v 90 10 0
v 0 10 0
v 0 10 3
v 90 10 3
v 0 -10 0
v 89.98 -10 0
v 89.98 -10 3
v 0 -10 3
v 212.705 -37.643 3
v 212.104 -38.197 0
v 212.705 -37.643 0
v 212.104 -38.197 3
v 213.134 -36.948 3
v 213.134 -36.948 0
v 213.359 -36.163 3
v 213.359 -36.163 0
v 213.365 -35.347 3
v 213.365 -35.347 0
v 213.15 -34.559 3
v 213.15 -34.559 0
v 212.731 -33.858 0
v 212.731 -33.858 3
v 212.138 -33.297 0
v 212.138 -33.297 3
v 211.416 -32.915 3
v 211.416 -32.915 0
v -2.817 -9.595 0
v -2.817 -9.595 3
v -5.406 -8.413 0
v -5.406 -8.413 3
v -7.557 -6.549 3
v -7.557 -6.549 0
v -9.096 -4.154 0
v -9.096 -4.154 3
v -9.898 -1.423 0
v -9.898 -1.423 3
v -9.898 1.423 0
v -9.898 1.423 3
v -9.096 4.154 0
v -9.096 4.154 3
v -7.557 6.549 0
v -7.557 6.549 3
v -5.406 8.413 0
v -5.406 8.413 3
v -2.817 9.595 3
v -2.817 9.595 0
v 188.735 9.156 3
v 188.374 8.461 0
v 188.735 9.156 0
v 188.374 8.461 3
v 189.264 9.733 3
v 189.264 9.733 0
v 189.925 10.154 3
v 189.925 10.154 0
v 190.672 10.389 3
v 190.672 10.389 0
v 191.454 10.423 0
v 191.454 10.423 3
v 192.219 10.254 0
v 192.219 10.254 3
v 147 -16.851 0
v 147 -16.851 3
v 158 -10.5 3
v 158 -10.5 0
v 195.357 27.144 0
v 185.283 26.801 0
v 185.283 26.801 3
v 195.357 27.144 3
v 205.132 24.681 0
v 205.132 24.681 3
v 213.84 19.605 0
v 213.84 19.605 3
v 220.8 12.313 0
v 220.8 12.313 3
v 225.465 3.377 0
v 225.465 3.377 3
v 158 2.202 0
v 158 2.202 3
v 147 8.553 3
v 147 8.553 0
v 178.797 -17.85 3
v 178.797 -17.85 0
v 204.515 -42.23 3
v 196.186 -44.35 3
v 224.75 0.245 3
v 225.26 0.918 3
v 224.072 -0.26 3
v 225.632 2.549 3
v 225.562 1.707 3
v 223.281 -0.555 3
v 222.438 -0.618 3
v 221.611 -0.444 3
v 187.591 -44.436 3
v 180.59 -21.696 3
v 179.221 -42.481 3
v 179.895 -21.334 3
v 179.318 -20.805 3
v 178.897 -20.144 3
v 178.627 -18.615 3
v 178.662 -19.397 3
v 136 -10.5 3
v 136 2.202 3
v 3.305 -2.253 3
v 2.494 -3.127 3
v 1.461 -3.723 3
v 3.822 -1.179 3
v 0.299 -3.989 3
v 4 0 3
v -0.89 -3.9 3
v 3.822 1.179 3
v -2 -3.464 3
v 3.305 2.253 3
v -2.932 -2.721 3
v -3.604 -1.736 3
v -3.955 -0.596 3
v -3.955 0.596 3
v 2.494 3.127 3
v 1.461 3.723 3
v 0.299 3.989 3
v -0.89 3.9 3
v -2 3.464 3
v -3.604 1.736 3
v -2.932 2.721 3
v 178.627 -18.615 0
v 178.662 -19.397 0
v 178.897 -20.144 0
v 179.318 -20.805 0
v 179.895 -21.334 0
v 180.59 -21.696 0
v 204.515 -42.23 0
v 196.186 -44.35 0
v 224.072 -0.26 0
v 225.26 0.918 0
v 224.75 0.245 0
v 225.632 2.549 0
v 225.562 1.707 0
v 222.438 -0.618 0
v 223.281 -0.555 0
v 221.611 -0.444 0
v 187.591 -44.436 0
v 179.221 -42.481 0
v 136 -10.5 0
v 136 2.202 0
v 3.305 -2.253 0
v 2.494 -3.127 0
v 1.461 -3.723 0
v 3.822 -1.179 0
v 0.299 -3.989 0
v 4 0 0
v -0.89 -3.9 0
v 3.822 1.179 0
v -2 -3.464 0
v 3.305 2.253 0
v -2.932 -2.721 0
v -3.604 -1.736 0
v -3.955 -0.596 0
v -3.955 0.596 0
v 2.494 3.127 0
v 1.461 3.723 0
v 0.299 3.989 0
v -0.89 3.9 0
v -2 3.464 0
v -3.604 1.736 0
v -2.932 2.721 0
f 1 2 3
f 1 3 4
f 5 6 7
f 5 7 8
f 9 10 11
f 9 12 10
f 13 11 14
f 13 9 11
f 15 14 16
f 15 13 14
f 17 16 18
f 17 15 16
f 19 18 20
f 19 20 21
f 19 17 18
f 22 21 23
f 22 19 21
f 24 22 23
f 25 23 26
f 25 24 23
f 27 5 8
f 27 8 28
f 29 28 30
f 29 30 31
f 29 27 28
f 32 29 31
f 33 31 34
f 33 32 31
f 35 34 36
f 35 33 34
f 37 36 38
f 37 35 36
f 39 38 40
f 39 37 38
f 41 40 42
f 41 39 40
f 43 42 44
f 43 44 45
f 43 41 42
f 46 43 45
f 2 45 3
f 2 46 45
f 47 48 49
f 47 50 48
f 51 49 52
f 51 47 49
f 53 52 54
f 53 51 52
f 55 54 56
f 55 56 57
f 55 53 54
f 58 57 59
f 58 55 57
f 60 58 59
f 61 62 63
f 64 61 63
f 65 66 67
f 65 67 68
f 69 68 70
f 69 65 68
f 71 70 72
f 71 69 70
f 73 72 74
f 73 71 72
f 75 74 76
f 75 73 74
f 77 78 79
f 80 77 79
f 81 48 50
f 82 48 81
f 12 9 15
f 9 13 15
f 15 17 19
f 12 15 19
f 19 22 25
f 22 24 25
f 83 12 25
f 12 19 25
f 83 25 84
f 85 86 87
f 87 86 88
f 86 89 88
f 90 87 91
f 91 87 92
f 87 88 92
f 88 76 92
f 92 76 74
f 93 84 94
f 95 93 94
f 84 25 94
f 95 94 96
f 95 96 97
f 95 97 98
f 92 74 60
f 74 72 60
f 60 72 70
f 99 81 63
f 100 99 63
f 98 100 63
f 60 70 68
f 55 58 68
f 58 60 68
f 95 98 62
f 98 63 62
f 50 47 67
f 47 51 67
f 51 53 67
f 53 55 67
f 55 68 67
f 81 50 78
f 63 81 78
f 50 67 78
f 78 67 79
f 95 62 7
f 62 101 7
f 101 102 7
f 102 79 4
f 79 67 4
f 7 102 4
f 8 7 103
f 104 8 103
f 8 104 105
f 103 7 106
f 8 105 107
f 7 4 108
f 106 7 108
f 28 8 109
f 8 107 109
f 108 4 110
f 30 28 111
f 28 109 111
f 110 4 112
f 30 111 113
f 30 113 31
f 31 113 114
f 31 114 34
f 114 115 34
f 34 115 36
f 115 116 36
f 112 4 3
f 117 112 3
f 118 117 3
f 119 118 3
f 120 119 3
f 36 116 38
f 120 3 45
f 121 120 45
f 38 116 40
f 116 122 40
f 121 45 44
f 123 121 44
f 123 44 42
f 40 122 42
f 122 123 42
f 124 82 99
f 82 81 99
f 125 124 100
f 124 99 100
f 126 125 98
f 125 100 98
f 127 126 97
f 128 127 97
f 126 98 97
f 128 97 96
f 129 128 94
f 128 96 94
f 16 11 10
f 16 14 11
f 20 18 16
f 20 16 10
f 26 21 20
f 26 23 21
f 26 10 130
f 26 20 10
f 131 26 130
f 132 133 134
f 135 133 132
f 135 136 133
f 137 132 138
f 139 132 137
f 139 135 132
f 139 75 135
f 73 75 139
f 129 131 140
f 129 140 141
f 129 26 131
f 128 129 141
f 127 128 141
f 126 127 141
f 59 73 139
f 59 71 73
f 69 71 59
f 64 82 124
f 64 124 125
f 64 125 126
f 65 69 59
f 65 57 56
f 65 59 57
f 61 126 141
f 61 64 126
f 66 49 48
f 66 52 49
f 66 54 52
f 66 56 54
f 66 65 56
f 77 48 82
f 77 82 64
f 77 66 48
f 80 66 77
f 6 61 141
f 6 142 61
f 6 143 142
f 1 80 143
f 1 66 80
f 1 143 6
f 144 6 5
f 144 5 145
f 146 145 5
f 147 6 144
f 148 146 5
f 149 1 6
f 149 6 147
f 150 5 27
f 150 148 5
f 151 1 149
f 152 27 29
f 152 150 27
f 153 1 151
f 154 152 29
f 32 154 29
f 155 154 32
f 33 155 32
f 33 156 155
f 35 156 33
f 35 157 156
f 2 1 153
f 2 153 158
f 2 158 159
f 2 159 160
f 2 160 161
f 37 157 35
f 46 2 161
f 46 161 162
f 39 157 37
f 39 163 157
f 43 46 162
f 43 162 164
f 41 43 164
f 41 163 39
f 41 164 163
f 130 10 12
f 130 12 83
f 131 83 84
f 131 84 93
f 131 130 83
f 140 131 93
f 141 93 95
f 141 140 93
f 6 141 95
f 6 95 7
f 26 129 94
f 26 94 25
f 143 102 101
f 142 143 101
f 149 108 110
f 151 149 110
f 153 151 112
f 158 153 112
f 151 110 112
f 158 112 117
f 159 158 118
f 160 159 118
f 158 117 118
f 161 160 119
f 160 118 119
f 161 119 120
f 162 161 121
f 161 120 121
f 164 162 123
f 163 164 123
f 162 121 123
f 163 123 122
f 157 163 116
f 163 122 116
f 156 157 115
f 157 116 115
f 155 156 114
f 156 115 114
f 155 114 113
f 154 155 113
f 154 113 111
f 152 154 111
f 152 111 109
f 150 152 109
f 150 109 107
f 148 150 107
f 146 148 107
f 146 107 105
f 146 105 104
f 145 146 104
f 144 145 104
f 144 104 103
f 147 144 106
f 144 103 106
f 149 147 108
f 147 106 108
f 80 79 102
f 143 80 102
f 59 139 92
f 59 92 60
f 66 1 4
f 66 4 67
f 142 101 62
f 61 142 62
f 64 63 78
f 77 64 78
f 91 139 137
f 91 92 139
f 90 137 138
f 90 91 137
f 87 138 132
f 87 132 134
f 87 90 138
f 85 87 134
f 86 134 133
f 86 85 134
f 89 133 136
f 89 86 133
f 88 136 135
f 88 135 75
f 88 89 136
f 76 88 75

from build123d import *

# Parameters (mm, degrees)
BOSS_EXTRUDE1_DEPTH = 3
SKETCH3_R           = 4
CUT_EXTRUDE1_DEPTH  = 3
FILLET2_R           = 3
FILLET3_R           = 3
FILLET4_R           = 3
FILLET5_R           = 3


with BuildPart() as part:
    # Sketch2 → Boss-Extrude1 (new body)
    with BuildSketch(Plane.XY):
        with BuildLine():
            Line((0, 10), (90, 10))
            Line((90, 10), (185.282890453, 26.800944387))
            ThreePointArc((185.282890453, 26.800944387), (212.182976557, 20.837338873), (226.987303957, -2.400800326))
            Line((226.987303957, -2.400800326), (189.399599126, 11.280005407))
            Line((189.399599126, 11.280005407), (177.770914253, -20.669543699))
            Line((177.770914253, -20.669543699), (216.366079007, -34.717034857))
            ThreePointArc((216.366079007, -34.717034857), (198.899834433, -43.890576734), (179.221499689, -42.48106907))
            Line((179.221499689, -42.48106907), (89.98049586, -10))
            Line((89.98049586, -10), (0, -10))
            ThreePointArc((0, -10), (-10, 0), (0, 10))
        make_face()
    extrude(amount=BOSS_EXTRUDE1_DEPTH)

    # Sketch3 → Cut-Extrude1 (cut)
    with BuildSketch(Plane.XY.offset(3)):
        Circle(SKETCH3_R)
        Polygon((147, -16.85066389), (158, -10.499810929), (158, 2.201894993), (147, 8.552747954), (136, 2.201894993), (136, -10.499810929), align=None)
    extrude(amount=-CUT_EXTRUDE1_DEPTH, mode=Mode.SUBTRACT)

    # Fillet2
    fillet2_edges = [part.edges().sort_by_distance(p)[0] for p in [
        (216.366079007, -34.717034857, 1.5),
    ]]
    fillet(fillet2_edges, radius=FILLET2_R)

    # Fillet3
    fillet3_edges = [part.edges().sort_by_distance(p)[0] for p in [
        (226.987303957, -2.400800326, 1.5),
    ]]
    fillet(fillet3_edges, radius=FILLET3_R)

    # Fillet4
    fillet4_edges = [part.edges().sort_by_distance(p)[0] for p in [
        (177.770914253, -20.669543699, 1.5),
    ]]
    fillet(fillet4_edges, radius=FILLET4_R)

    # Fillet5
    fillet5_edges = [part.edges().sort_by_distance(p)[0] for p in [
        (189.399599126, 11.280005407, 1.5),
    ]]
    fillet(fillet5_edges, radius=FILLET5_R)


solid = part.part
